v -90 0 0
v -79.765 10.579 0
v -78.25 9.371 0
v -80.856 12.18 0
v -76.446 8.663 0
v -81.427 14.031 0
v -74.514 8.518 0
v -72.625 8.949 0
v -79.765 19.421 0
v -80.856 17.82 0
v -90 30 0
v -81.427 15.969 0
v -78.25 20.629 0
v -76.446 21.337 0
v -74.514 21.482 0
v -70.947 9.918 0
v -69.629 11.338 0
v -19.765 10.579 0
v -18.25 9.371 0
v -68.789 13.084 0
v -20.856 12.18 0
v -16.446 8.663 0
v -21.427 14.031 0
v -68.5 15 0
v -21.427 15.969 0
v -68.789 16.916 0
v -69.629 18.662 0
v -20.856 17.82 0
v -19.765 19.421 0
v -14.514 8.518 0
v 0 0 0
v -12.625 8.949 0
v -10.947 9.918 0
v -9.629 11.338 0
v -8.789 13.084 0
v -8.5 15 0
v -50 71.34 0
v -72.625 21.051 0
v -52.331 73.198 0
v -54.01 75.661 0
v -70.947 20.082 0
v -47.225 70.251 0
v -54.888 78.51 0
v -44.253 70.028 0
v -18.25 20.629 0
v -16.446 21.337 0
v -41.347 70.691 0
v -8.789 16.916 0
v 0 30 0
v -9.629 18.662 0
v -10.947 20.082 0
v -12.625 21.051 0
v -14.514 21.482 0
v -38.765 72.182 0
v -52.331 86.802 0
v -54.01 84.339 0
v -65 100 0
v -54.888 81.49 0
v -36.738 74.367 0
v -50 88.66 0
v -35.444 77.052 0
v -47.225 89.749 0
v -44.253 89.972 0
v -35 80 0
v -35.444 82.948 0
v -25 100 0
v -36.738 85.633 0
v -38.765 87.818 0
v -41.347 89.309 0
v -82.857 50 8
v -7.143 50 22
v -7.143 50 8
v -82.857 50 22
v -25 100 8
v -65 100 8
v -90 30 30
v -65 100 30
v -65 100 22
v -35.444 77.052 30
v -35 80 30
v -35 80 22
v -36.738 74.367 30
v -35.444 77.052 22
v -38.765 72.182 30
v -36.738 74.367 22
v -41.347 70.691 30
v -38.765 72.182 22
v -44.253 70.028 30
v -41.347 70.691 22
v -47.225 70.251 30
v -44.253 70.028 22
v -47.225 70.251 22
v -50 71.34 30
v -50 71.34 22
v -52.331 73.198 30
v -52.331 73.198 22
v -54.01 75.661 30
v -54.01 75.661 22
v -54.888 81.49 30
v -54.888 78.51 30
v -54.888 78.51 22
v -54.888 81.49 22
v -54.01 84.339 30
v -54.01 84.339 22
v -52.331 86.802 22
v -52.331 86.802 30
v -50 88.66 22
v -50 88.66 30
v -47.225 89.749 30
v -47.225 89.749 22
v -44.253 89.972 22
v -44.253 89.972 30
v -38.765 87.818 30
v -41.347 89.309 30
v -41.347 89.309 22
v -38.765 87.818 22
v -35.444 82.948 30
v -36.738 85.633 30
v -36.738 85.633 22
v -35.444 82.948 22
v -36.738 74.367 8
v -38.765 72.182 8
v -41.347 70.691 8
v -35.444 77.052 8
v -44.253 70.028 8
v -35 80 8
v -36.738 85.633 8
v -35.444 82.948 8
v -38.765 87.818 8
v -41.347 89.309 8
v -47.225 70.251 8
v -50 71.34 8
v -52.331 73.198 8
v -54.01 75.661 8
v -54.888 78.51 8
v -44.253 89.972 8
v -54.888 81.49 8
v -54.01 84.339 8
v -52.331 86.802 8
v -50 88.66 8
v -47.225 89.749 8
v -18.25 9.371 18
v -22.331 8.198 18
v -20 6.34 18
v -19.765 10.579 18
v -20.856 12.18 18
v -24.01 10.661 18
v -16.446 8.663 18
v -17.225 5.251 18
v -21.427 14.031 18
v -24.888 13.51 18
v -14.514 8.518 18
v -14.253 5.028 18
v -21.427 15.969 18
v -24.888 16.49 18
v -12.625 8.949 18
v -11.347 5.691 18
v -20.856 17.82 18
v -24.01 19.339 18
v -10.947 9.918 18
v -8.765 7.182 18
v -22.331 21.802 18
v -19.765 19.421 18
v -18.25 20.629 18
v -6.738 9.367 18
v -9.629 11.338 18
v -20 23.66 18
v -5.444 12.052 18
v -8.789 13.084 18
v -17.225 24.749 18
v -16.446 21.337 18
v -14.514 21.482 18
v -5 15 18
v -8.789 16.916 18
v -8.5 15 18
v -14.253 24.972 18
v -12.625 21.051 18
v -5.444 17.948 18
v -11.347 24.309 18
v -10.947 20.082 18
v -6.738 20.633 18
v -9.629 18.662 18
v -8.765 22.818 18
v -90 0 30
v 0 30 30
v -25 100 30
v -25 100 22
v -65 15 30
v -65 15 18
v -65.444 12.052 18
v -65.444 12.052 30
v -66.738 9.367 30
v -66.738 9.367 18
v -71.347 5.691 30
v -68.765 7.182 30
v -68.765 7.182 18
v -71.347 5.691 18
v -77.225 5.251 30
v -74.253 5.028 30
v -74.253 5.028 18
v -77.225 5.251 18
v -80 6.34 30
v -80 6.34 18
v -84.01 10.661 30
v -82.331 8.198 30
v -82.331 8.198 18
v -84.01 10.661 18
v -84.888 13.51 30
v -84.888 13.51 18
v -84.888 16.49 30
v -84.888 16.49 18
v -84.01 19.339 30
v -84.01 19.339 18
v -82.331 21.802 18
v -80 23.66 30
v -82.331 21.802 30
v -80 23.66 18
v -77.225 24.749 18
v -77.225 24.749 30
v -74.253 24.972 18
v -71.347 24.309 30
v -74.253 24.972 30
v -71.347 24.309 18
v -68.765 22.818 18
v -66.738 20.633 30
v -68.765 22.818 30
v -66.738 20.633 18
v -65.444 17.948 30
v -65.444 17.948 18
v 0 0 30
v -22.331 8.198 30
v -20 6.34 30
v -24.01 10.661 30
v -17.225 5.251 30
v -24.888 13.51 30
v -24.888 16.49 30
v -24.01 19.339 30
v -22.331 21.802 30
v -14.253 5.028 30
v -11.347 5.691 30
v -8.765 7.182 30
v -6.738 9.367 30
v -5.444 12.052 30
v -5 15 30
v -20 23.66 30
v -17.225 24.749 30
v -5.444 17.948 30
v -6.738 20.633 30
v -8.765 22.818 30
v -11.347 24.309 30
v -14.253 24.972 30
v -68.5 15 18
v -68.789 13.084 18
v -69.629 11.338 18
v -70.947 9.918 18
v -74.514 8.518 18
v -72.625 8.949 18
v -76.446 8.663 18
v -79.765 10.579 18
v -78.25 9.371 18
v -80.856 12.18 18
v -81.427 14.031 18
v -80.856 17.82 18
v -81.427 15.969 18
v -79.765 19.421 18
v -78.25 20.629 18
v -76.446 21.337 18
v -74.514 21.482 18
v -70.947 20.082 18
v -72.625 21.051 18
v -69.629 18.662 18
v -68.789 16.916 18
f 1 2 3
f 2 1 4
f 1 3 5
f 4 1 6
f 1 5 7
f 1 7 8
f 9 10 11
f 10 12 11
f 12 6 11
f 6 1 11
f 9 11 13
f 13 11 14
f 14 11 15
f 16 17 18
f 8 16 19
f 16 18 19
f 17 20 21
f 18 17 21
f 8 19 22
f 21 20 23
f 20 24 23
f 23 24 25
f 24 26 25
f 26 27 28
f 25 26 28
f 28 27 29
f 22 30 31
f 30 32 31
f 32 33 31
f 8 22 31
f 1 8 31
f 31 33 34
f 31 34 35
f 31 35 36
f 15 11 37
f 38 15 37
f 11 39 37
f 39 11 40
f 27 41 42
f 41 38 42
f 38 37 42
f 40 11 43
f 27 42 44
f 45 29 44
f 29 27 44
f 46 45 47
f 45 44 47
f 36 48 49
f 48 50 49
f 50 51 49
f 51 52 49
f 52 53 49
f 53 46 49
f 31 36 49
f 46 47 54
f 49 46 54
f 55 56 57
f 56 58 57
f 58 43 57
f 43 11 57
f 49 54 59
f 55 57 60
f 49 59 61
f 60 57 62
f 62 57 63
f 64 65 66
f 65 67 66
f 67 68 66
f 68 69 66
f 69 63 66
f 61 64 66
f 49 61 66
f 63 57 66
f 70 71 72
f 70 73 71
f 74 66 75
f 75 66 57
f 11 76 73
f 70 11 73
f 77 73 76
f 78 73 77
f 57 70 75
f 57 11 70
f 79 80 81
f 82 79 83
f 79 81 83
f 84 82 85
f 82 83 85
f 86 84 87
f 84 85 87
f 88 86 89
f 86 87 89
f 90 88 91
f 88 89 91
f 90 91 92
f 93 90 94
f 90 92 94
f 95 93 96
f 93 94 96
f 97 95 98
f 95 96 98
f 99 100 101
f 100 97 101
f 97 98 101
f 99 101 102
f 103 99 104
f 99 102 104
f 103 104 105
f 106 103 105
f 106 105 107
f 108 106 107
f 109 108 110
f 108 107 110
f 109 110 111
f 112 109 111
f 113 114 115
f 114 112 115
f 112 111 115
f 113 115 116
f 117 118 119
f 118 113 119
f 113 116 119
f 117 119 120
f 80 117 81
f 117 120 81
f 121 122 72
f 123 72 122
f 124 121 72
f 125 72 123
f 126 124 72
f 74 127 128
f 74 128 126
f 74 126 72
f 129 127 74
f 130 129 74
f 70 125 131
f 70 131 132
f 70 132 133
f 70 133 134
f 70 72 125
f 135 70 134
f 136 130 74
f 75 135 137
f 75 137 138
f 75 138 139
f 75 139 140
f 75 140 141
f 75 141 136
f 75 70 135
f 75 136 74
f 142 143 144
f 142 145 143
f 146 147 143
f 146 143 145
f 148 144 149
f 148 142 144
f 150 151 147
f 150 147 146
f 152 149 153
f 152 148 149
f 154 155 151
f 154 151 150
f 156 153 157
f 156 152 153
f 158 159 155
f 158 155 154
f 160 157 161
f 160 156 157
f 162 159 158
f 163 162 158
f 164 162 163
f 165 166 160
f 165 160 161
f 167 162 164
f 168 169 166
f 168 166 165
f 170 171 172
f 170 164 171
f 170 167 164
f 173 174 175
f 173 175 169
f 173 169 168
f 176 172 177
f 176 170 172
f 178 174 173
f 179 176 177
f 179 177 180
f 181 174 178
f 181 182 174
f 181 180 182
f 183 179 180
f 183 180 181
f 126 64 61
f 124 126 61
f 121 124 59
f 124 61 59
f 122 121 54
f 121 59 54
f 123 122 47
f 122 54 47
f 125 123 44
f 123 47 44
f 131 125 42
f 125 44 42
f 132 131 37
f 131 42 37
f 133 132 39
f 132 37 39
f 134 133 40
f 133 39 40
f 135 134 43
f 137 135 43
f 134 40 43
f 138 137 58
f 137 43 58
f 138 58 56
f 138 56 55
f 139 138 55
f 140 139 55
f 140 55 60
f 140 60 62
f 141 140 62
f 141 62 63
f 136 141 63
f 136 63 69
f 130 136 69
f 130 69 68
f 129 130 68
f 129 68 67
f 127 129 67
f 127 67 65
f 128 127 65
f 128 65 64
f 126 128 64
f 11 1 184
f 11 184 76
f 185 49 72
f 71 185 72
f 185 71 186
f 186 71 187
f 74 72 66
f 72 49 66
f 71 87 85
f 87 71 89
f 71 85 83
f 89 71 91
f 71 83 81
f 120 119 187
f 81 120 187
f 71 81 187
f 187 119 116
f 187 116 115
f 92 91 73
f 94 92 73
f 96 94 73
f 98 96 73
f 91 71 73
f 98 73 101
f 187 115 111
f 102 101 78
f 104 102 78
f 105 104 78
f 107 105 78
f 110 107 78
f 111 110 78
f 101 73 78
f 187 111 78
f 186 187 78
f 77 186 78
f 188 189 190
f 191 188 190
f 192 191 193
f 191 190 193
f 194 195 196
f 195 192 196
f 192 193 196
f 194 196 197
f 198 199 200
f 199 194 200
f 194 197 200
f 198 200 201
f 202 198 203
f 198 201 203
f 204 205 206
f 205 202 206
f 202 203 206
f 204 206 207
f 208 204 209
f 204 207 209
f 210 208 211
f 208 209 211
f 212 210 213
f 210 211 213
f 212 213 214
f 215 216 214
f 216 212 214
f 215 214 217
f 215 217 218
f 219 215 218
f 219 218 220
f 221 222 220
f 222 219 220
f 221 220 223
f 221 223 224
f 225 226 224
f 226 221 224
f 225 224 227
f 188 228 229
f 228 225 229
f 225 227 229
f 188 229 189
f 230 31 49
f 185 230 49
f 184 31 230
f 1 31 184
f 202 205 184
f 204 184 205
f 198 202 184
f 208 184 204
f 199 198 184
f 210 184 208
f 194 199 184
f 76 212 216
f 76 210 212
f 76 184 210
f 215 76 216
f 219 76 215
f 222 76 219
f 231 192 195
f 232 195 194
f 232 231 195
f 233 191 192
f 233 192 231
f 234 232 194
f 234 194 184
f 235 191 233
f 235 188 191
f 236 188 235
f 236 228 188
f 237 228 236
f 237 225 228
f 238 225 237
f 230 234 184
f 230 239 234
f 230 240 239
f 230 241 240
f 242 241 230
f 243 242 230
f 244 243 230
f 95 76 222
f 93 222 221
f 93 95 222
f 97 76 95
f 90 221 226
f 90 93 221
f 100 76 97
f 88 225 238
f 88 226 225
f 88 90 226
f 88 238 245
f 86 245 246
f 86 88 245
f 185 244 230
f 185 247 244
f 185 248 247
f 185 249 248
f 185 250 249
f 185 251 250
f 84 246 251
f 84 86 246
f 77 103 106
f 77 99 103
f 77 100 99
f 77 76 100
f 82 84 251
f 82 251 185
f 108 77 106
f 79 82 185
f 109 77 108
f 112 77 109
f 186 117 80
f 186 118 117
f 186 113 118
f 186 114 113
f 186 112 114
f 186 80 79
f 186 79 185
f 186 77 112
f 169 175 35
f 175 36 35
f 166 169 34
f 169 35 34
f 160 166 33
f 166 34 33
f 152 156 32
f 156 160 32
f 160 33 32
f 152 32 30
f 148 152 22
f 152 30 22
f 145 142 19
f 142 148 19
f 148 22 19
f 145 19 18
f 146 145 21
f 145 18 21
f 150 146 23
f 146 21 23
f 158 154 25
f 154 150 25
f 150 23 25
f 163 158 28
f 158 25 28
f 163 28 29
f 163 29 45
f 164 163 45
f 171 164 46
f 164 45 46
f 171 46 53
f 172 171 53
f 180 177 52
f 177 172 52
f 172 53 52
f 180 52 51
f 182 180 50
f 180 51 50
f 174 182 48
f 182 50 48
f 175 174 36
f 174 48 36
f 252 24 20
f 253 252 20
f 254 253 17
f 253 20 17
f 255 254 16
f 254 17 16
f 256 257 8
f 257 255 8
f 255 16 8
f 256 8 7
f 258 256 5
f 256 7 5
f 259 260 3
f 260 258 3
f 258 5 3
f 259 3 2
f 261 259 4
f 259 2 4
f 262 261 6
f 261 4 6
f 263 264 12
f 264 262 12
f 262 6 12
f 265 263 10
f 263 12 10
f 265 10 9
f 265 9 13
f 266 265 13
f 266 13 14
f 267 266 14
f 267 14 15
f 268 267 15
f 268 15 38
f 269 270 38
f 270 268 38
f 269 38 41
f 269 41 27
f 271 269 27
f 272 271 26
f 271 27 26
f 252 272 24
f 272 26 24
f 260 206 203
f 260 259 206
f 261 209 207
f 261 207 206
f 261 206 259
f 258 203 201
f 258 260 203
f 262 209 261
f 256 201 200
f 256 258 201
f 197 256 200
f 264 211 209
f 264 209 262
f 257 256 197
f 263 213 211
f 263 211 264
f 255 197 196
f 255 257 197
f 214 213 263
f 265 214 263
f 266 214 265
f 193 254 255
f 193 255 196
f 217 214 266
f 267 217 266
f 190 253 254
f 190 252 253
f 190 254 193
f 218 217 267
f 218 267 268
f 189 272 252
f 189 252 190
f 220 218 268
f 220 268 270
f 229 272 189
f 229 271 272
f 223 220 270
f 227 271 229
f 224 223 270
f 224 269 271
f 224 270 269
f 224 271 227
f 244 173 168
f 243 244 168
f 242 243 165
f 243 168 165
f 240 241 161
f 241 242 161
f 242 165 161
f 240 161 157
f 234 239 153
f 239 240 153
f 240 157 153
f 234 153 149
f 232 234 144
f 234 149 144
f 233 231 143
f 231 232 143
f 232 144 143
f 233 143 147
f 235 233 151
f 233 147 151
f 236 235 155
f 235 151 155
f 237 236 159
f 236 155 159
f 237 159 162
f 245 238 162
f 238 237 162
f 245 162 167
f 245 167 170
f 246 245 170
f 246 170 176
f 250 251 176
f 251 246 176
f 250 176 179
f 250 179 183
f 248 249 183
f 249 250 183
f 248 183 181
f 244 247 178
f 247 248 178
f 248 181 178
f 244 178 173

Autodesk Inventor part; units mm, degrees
ref_plane "YZ Plane" through (0, 0, 0) normal (1, 0, 0) x (0, 1, 0)
ref_plane "XZ Plane" through (0, 0, 0) normal (0, 1, 0) x (-1, 0, 0)
ref_plane "XY Plane" through (0, 0, 0) normal (0, 0, 1) x (1, 0, 0)
sketch "Náčrt1" plane through (0, 0, 0) normal (0, 0, 1) x (1, 0, 0)
  line L0 (0, 0) -> (-90, 0)
  line L1 (-90, 0) -> (-90, 30)
  line L2 (-45, 0) -> (-45, 128.8279) construction
  line L3 (-45, 100) -> (-65, 100)
  line L4 (-90, 30) -> (-65, 100)
  line L5 (0, 0) -> (0, 30)
  line L6 (-45, 100) -> (-25, 100)
  line L7 (0, 30) -> (-25, 100)
  circle A0 centre (-45, 80) radius 10
  circle A1 centre (-75, 15) radius 6.5
  circle A2 centre (-75, 15) radius 10
  circle A3 centre (-15, 15) radius 6.5
  circle A4 centre (-15, 15) radius 10
  dimension "d0" = 90
  dimension "d1" = 30
  dimension "d4" = 20
  dimension "d5" = 100
  dimension "d6" = 20
  dimension "d7" = 80
  dimension "d8" = 13
  dimension "d10" = 15
  dimension "d11" = 20
  dimension "d12" = 15
extrude "Vysunutí1" add sketch "Náčrt1" along normal blind 30 contours L0 L1 L4 L3 L6 L7 L5
sketch "Náčrt2" plane through (0, 0, 0) normal (0, 0, 1) x (1, 0, 0)
  circle A0 centre (-15, 15) radius 10 projected
  circle A1 centre (-75, 15) radius 10 projected
  circle A2 centre (-75, 15) radius 6.5
  circle A3 centre (-15, 15) radius 6.5
  point P0 (0, 0)
  dimension "d15" = 13
  dimension "d16" = 13
extrude "Vysunutí2" add sketch "Náčrt2" along normal blind 18
sketch "Náčrt3" plane through (-90, 0, 0) normal (-1, 0, 0) x (0, 0, 1)
  line L0 (0, 30) -> (30, 30) construction
  line L1 (15, 30) -> (15, 100) construction
  line L2 (0, 100) -> (30, 100) construction
  line L3 (15, 50) -> (22, 50)
  line L4 (22, 50) -> (22, 100)
  line L5 (22, 100) -> (15, 100)
  line L6 (30, 100) -> (0, 100) construction
  line L7 (15, 50) -> (8, 50)
  line L8 (8, 50) -> (8, 100)
  line L9 (8, 100) -> (15, 100)
  point P0 (0, 0)
  dimension "d19" = 7
  dimension "d20" = 50
extrude "Vysunutí3" cut sketch "Náčrt3" against normal through all
properties part number "Součást9"
